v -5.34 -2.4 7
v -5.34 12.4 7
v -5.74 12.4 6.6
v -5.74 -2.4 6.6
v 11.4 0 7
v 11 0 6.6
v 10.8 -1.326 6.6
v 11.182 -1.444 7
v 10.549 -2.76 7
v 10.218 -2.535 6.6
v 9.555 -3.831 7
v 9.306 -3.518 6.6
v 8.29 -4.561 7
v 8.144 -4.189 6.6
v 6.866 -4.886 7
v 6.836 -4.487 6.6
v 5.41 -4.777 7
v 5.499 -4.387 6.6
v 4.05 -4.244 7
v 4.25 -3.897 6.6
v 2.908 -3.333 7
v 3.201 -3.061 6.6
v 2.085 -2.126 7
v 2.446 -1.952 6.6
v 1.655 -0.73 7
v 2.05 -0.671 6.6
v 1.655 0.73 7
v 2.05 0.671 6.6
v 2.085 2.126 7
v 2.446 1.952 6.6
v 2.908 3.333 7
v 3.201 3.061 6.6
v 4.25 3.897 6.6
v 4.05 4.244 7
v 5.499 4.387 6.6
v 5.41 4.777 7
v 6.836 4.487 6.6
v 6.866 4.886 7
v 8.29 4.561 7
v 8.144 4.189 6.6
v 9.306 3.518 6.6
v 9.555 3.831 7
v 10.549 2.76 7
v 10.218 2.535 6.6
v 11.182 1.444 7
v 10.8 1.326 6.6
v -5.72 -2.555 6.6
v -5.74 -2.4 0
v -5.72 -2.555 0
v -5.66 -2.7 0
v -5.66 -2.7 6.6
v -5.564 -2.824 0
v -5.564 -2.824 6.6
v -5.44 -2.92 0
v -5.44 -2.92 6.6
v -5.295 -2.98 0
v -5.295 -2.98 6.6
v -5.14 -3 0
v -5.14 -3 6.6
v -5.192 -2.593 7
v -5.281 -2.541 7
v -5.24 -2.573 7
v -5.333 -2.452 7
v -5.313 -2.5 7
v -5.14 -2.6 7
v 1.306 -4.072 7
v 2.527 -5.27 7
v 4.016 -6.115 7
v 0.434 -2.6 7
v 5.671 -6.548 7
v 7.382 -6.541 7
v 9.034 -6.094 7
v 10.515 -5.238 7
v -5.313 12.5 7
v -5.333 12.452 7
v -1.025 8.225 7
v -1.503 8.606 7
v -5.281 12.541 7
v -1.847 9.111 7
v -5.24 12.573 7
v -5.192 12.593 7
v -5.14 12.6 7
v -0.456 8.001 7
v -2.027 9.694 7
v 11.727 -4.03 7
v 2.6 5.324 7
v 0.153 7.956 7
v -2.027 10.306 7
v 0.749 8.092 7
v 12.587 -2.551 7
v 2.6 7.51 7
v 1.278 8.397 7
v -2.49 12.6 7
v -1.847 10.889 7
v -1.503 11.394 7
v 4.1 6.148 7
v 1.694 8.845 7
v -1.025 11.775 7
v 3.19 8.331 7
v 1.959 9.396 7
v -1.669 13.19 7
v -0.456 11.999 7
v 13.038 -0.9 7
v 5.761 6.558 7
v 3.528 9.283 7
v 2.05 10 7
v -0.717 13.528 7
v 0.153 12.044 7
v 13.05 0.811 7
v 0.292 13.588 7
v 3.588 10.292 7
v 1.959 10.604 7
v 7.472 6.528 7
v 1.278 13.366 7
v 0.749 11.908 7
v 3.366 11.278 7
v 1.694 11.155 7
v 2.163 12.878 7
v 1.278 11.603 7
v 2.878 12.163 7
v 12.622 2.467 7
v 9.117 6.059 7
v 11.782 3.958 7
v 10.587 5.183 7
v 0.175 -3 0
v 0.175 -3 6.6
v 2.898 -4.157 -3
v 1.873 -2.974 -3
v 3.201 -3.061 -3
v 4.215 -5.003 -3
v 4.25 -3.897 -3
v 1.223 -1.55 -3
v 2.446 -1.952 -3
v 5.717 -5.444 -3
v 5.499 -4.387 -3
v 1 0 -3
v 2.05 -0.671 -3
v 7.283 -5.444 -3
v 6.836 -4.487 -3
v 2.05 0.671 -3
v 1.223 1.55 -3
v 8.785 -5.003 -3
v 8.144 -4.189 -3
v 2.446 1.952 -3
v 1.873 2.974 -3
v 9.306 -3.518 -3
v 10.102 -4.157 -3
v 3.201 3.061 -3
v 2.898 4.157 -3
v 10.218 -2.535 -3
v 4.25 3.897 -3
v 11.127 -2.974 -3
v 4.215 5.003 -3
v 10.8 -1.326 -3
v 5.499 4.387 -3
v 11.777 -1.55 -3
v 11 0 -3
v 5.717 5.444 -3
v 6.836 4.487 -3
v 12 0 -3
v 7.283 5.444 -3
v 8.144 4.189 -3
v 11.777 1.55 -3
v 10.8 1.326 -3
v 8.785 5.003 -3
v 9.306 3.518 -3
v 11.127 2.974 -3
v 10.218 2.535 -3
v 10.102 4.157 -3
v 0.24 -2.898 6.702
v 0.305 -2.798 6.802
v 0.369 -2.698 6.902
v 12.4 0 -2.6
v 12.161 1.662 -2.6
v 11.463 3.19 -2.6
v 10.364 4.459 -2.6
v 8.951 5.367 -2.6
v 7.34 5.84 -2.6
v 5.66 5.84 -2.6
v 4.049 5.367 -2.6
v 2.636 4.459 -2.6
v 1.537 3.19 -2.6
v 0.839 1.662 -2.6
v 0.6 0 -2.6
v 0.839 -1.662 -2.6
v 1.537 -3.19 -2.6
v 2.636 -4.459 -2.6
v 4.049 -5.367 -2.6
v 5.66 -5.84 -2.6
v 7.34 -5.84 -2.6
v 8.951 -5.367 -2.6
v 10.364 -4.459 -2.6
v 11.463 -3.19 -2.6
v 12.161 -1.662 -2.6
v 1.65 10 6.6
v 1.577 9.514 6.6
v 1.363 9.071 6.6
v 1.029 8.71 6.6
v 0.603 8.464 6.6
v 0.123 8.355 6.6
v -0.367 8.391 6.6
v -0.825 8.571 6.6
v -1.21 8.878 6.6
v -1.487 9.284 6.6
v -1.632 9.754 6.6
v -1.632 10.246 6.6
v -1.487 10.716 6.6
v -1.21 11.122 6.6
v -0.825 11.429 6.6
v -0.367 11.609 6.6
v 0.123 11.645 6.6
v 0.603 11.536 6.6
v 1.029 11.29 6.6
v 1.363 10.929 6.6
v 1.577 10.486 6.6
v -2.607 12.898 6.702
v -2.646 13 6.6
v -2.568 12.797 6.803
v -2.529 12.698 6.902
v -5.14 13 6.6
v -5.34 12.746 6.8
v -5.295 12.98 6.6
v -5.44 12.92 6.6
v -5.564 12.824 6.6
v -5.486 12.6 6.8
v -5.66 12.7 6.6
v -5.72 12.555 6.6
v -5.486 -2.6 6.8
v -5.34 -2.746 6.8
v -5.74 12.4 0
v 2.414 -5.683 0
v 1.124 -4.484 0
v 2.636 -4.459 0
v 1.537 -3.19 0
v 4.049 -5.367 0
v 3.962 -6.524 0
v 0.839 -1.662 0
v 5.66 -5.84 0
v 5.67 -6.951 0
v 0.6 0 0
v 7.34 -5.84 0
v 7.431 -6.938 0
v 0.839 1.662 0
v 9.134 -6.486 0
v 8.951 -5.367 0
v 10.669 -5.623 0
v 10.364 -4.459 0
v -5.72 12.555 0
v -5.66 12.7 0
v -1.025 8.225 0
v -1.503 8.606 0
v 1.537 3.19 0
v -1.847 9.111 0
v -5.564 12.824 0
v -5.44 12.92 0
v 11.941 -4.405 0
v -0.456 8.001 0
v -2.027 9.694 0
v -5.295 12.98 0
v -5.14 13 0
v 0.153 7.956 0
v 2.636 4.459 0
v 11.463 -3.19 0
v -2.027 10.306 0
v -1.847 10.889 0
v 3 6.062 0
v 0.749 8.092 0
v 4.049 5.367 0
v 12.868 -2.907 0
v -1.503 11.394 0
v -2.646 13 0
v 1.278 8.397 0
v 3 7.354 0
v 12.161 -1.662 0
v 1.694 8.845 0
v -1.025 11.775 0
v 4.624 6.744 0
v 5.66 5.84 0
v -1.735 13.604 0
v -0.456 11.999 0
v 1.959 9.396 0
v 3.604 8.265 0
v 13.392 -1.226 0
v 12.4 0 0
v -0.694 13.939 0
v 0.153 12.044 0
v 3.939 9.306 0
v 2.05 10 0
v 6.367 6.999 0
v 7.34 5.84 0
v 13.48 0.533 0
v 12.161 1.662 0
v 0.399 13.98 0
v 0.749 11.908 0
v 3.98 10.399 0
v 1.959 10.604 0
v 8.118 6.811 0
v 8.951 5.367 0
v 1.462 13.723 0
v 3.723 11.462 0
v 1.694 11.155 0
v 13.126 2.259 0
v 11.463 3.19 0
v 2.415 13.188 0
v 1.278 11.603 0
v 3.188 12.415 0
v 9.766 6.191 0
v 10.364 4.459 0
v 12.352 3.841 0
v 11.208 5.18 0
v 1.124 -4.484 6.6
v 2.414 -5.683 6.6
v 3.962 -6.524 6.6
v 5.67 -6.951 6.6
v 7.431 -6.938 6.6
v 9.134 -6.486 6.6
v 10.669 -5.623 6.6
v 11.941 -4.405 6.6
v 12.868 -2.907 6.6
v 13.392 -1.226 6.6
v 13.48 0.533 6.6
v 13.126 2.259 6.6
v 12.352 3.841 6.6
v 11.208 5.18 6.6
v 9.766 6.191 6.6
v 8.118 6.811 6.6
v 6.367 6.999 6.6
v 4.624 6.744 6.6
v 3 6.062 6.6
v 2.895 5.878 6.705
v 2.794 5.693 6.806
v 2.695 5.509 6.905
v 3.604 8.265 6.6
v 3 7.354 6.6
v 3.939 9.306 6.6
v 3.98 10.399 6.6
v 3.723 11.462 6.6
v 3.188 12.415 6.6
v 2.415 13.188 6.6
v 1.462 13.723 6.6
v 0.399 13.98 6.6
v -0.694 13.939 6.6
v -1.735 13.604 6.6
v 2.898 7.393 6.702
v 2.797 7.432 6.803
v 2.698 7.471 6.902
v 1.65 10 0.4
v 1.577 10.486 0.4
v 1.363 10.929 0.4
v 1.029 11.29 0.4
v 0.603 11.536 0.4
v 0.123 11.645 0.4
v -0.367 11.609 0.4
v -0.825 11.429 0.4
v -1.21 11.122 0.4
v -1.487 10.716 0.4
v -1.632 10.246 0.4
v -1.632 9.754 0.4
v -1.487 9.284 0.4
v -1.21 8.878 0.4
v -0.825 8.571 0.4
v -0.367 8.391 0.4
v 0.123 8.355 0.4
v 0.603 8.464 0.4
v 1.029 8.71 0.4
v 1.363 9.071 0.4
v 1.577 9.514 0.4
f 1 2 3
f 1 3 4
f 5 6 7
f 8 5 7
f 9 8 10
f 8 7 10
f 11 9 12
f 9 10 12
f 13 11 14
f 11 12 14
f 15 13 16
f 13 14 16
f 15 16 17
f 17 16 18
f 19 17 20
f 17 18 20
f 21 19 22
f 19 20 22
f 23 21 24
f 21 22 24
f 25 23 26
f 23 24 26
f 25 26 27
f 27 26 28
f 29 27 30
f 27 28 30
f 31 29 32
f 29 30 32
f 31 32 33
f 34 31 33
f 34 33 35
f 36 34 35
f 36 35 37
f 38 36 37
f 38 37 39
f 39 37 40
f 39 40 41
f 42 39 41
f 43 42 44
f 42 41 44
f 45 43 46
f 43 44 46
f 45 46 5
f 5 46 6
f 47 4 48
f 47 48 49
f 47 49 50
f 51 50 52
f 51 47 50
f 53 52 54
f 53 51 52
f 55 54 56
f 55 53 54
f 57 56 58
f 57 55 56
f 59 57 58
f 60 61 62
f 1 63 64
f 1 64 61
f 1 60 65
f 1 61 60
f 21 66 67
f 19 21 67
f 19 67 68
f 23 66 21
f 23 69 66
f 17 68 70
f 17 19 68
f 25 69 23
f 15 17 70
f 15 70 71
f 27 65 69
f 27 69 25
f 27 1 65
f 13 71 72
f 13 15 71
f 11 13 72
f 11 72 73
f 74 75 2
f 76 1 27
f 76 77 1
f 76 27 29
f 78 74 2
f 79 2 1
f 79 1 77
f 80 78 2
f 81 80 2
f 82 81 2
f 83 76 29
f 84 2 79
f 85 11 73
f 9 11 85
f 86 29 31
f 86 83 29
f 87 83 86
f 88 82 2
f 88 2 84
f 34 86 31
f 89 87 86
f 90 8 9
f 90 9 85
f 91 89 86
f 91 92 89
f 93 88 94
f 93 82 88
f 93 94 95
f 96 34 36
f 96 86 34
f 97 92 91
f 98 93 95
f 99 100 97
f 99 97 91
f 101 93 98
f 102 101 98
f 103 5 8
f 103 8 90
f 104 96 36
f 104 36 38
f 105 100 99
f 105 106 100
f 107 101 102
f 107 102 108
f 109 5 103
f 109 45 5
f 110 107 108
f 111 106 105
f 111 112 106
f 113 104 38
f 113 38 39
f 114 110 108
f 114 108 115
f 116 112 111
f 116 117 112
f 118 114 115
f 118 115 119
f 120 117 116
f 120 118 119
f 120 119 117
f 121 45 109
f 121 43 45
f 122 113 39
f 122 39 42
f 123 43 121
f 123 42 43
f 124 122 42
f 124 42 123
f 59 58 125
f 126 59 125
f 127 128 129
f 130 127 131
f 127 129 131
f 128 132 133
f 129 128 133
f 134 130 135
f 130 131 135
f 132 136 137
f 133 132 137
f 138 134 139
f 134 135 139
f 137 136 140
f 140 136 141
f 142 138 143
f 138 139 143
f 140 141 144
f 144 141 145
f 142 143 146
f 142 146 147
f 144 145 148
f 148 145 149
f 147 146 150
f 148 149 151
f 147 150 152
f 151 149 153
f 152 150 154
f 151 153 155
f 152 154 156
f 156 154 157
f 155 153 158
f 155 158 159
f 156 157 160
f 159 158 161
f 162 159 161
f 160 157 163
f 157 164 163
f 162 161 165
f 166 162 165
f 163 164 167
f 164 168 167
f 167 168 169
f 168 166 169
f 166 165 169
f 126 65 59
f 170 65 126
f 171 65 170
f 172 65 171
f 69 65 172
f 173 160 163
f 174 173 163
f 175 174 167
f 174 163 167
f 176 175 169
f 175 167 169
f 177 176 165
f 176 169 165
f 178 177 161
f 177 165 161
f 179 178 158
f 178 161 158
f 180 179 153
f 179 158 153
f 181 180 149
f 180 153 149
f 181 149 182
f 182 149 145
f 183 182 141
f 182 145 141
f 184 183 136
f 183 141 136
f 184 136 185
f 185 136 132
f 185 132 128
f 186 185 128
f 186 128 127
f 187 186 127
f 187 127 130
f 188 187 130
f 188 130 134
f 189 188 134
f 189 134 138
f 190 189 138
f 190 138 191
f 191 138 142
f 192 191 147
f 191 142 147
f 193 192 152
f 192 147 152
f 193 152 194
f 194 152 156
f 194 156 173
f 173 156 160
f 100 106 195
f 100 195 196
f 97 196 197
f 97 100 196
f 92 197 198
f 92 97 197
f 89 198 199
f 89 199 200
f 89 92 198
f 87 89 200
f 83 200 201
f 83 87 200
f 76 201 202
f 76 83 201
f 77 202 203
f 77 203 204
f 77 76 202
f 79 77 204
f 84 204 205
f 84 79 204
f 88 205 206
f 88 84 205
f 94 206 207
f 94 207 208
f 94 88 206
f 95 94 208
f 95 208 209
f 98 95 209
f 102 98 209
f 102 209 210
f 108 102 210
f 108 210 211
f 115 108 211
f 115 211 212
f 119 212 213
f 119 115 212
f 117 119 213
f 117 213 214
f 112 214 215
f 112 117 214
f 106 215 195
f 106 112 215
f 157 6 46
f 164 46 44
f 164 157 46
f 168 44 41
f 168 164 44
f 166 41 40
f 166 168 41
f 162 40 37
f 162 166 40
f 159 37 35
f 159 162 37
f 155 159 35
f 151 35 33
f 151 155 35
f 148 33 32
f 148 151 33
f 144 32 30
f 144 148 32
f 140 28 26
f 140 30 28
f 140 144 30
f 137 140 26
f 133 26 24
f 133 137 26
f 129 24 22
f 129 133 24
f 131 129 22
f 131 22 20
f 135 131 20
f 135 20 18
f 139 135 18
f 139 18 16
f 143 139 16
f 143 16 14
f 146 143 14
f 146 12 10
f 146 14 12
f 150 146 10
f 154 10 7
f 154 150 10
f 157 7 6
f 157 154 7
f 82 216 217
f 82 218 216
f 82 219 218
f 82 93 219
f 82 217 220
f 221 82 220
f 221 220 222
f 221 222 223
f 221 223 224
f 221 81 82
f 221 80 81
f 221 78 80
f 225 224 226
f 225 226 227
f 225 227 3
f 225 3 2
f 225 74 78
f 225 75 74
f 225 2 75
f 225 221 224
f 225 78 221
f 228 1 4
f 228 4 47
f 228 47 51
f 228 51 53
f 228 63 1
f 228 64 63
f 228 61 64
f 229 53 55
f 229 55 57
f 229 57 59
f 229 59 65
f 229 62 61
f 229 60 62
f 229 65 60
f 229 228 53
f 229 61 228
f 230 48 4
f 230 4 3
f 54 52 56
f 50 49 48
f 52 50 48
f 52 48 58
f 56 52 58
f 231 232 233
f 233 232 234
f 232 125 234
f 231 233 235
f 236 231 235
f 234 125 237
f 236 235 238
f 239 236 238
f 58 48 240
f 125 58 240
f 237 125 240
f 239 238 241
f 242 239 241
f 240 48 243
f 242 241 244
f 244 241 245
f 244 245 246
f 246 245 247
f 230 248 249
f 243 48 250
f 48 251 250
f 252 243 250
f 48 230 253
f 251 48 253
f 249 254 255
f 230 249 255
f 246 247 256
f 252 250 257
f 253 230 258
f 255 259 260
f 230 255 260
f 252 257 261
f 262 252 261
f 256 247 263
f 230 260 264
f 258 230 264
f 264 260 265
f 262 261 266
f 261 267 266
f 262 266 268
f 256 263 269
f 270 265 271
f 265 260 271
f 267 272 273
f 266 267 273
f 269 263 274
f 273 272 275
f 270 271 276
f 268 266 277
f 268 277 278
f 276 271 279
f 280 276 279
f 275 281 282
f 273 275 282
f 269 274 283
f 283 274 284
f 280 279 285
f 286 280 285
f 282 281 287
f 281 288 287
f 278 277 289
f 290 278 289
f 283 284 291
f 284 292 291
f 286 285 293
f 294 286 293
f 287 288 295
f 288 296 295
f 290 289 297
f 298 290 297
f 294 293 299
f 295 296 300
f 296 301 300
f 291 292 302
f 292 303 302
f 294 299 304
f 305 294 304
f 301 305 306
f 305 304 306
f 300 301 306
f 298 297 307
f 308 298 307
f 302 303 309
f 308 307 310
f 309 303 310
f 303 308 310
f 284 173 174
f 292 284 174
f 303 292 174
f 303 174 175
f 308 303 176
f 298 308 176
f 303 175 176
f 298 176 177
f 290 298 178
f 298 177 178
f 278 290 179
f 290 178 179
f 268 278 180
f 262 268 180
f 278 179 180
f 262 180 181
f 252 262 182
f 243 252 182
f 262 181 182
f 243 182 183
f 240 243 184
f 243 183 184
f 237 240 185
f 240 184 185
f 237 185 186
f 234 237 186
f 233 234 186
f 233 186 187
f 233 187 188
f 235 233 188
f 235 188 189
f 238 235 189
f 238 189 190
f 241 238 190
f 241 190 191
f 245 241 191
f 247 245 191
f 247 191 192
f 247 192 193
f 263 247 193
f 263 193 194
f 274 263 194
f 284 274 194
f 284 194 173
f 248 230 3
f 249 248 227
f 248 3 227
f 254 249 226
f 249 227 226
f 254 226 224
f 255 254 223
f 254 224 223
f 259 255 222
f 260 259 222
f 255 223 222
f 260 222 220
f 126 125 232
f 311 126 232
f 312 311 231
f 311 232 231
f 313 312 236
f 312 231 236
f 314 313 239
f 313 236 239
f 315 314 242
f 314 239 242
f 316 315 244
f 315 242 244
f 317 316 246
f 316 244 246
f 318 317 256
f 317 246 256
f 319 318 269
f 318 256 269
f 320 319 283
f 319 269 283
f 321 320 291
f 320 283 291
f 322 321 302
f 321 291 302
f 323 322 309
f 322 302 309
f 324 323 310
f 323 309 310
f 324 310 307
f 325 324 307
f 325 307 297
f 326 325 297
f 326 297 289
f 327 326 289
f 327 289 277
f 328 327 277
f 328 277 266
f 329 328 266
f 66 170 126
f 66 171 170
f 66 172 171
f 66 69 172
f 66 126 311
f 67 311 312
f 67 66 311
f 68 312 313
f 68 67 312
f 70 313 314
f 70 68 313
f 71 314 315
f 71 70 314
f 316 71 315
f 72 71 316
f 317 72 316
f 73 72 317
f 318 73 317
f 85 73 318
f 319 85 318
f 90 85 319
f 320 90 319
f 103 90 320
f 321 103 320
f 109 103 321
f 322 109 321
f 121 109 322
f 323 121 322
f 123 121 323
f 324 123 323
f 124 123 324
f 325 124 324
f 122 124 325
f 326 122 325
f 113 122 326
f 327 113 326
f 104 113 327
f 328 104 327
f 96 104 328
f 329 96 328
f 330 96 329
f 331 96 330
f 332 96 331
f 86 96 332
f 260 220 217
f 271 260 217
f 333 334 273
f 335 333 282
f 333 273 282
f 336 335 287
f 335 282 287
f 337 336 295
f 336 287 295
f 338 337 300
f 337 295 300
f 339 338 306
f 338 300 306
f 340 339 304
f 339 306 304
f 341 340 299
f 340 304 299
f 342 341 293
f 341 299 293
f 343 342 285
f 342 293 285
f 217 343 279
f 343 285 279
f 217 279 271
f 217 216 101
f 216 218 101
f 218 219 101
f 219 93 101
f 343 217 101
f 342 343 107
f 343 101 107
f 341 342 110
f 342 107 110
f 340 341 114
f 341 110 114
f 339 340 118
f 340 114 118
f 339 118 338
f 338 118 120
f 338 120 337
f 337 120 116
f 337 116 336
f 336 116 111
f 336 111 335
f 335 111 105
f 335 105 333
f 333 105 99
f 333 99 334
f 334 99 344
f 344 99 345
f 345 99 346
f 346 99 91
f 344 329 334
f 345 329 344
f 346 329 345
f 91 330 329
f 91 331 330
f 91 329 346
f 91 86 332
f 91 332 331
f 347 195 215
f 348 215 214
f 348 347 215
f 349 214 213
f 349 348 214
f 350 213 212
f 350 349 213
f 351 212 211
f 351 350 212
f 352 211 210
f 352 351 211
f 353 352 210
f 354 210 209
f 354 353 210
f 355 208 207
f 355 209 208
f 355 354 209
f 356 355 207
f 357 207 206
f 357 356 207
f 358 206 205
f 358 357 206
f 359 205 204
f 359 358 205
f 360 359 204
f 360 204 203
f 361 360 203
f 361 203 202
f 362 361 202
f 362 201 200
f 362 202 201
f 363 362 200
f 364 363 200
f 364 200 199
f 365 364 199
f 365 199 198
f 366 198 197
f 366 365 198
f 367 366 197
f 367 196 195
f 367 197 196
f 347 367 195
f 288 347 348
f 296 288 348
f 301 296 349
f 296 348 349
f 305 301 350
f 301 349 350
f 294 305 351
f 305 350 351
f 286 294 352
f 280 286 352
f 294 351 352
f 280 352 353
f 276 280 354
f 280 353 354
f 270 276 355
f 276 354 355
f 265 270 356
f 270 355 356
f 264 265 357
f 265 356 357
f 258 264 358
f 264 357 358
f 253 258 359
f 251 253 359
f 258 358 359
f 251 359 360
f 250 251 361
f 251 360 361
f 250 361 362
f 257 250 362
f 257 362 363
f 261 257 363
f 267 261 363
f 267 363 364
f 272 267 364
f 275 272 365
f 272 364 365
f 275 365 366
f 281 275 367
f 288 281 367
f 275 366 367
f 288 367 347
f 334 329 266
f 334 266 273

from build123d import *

# Parameters (mm, degrees)
CYLINDER004_R     = 4.5
CYLINDER004_DEPTH = 12
CYLINDER_R        = 1.65
CYLINDER_DEPTH    = 8
BOX_W             = 8.74
BOX_H             = 16
BOX_DEPTH         = 7
FILLET012_R       = 0.6
FILLET013_R       = 3
CYLINDER006_R     = 4
CYLINDER006_DEPTH = 7
CYLINDER003_R     = 5.9
CYLINDER003_DEPTH = 10
CYLINDER002_R     = 7
CYLINDER002_DEPTH = 7
CHAMFER010_SIZE   = 0.4


with BuildPart() as cylinder004:
    # Cylinder004 → Cylinder004 (new body)
    with BuildSketch(Plane(origin=(6.5, 0, -3), x_dir=(1, 0, 0), z_dir=(0, 0, 1))):
        Circle(CYLINDER004_R)
    extrude(amount=CYLINDER004_DEPTH)


with BuildPart() as cylinder:
    # Cylinder → Cylinder (new body)
    with BuildSketch(Plane(origin=(0, 10, 0), x_dir=(1, 0, 0), z_dir=(0, 0, 1))):
        Circle(CYLINDER_R)
    extrude(amount=CYLINDER_DEPTH)


with BuildPart() as fillet013:
    # Box → Box (new body)
    with BuildSketch(Plane(origin=(-5.74, -3, 0), x_dir=(1, 0, 0), z_dir=(0, 0, 1))):
        with Locations((4.37, 8)):
            Rectangle(BOX_W, BOX_H)
    extrude(amount=BOX_DEPTH)

    # Fillet012
    fillet012_edges = [fillet013.edges().sort_by_distance(p)[0] for p in [
        (-5.74, -3, 3.5),
        (-5.74, 13, 3.5),
    ]]
    fillet(fillet012_edges, radius=FILLET012_R)

    # Fillet013
    fillet013_edges = [fillet013.edges().sort_by_distance(p)[0] for p in [
        (3, 13, 3.5),
    ]]
    fillet(fillet013_edges, radius=FILLET013_R)


with BuildPart() as cut002:
    # Cylinder006 → Cylinder006 (new body)
    with BuildSketch(Plane(origin=(0, 10, 0), x_dir=(1, 0, 0), z_dir=(0, 0, 1))):
        Circle(CYLINDER006_R)
    extrude(amount=CYLINDER006_DEPTH)

    # Fusion001: union Fillet013
    add(fillet013.part)

    # Cut002: cut Cylinder
    add(cylinder.part, mode=Mode.SUBTRACT)


with BuildPart() as cylinder003:
    # Cylinder003 → Cylinder003 (new body)
    with BuildSketch(Plane(origin=(6.5, 0, -3), x_dir=(1, 0, 0), z_dir=(0, 0, 1))):
        Circle(CYLINDER003_R)
    extrude(amount=CYLINDER003_DEPTH)


with BuildPart() as endstop_flag:
    # Cylinder002 → Cylinder002 (new body)
    with BuildSketch(Plane(origin=(6.5, 0, 0), x_dir=(1, 0, 0), z_dir=(0, 0, 1))):
        Circle(CYLINDER002_R)
    extrude(amount=CYLINDER002_DEPTH)

    # Fusion: union Cylinder003
    add(cylinder003.part)

    # Fusion002: union Cut002
    add(cut002.part)

    # Cut003: cut Cylinder004
    add(cylinder004.part, mode=Mode.SUBTRACT)

    # Chamfer010
    chamfer010_edges = [endstop_flag.edges().sort_by_distance(p)[0] for p in [
        (-2.482278, -3, 7),
        (-5.564264, -2.824264, 7),
        (-5.74, 5, 7),
        (-5.564264, 12.824264, 7),
        (-3.892876, 13, 7),
        (-1.65, 10, 0),
        (3, 6.708213, 7),
        (0.6, 0, -3),
        (8, 4.242641, 7),
        (2, 0, 7),
        (8, -4.242641, 7),
        (-1.65, 10, 7),
        (8.037549, -6.829051, 7),
        (10, 6.062178, 7),
        (3.741657, 8.585786, 7),
        (1.645751, 13.645751, 7),
    ]]
    chamfer(chamfer010_edges, length=CHAMFER010_SIZE)


solid = endstop_flag.part
